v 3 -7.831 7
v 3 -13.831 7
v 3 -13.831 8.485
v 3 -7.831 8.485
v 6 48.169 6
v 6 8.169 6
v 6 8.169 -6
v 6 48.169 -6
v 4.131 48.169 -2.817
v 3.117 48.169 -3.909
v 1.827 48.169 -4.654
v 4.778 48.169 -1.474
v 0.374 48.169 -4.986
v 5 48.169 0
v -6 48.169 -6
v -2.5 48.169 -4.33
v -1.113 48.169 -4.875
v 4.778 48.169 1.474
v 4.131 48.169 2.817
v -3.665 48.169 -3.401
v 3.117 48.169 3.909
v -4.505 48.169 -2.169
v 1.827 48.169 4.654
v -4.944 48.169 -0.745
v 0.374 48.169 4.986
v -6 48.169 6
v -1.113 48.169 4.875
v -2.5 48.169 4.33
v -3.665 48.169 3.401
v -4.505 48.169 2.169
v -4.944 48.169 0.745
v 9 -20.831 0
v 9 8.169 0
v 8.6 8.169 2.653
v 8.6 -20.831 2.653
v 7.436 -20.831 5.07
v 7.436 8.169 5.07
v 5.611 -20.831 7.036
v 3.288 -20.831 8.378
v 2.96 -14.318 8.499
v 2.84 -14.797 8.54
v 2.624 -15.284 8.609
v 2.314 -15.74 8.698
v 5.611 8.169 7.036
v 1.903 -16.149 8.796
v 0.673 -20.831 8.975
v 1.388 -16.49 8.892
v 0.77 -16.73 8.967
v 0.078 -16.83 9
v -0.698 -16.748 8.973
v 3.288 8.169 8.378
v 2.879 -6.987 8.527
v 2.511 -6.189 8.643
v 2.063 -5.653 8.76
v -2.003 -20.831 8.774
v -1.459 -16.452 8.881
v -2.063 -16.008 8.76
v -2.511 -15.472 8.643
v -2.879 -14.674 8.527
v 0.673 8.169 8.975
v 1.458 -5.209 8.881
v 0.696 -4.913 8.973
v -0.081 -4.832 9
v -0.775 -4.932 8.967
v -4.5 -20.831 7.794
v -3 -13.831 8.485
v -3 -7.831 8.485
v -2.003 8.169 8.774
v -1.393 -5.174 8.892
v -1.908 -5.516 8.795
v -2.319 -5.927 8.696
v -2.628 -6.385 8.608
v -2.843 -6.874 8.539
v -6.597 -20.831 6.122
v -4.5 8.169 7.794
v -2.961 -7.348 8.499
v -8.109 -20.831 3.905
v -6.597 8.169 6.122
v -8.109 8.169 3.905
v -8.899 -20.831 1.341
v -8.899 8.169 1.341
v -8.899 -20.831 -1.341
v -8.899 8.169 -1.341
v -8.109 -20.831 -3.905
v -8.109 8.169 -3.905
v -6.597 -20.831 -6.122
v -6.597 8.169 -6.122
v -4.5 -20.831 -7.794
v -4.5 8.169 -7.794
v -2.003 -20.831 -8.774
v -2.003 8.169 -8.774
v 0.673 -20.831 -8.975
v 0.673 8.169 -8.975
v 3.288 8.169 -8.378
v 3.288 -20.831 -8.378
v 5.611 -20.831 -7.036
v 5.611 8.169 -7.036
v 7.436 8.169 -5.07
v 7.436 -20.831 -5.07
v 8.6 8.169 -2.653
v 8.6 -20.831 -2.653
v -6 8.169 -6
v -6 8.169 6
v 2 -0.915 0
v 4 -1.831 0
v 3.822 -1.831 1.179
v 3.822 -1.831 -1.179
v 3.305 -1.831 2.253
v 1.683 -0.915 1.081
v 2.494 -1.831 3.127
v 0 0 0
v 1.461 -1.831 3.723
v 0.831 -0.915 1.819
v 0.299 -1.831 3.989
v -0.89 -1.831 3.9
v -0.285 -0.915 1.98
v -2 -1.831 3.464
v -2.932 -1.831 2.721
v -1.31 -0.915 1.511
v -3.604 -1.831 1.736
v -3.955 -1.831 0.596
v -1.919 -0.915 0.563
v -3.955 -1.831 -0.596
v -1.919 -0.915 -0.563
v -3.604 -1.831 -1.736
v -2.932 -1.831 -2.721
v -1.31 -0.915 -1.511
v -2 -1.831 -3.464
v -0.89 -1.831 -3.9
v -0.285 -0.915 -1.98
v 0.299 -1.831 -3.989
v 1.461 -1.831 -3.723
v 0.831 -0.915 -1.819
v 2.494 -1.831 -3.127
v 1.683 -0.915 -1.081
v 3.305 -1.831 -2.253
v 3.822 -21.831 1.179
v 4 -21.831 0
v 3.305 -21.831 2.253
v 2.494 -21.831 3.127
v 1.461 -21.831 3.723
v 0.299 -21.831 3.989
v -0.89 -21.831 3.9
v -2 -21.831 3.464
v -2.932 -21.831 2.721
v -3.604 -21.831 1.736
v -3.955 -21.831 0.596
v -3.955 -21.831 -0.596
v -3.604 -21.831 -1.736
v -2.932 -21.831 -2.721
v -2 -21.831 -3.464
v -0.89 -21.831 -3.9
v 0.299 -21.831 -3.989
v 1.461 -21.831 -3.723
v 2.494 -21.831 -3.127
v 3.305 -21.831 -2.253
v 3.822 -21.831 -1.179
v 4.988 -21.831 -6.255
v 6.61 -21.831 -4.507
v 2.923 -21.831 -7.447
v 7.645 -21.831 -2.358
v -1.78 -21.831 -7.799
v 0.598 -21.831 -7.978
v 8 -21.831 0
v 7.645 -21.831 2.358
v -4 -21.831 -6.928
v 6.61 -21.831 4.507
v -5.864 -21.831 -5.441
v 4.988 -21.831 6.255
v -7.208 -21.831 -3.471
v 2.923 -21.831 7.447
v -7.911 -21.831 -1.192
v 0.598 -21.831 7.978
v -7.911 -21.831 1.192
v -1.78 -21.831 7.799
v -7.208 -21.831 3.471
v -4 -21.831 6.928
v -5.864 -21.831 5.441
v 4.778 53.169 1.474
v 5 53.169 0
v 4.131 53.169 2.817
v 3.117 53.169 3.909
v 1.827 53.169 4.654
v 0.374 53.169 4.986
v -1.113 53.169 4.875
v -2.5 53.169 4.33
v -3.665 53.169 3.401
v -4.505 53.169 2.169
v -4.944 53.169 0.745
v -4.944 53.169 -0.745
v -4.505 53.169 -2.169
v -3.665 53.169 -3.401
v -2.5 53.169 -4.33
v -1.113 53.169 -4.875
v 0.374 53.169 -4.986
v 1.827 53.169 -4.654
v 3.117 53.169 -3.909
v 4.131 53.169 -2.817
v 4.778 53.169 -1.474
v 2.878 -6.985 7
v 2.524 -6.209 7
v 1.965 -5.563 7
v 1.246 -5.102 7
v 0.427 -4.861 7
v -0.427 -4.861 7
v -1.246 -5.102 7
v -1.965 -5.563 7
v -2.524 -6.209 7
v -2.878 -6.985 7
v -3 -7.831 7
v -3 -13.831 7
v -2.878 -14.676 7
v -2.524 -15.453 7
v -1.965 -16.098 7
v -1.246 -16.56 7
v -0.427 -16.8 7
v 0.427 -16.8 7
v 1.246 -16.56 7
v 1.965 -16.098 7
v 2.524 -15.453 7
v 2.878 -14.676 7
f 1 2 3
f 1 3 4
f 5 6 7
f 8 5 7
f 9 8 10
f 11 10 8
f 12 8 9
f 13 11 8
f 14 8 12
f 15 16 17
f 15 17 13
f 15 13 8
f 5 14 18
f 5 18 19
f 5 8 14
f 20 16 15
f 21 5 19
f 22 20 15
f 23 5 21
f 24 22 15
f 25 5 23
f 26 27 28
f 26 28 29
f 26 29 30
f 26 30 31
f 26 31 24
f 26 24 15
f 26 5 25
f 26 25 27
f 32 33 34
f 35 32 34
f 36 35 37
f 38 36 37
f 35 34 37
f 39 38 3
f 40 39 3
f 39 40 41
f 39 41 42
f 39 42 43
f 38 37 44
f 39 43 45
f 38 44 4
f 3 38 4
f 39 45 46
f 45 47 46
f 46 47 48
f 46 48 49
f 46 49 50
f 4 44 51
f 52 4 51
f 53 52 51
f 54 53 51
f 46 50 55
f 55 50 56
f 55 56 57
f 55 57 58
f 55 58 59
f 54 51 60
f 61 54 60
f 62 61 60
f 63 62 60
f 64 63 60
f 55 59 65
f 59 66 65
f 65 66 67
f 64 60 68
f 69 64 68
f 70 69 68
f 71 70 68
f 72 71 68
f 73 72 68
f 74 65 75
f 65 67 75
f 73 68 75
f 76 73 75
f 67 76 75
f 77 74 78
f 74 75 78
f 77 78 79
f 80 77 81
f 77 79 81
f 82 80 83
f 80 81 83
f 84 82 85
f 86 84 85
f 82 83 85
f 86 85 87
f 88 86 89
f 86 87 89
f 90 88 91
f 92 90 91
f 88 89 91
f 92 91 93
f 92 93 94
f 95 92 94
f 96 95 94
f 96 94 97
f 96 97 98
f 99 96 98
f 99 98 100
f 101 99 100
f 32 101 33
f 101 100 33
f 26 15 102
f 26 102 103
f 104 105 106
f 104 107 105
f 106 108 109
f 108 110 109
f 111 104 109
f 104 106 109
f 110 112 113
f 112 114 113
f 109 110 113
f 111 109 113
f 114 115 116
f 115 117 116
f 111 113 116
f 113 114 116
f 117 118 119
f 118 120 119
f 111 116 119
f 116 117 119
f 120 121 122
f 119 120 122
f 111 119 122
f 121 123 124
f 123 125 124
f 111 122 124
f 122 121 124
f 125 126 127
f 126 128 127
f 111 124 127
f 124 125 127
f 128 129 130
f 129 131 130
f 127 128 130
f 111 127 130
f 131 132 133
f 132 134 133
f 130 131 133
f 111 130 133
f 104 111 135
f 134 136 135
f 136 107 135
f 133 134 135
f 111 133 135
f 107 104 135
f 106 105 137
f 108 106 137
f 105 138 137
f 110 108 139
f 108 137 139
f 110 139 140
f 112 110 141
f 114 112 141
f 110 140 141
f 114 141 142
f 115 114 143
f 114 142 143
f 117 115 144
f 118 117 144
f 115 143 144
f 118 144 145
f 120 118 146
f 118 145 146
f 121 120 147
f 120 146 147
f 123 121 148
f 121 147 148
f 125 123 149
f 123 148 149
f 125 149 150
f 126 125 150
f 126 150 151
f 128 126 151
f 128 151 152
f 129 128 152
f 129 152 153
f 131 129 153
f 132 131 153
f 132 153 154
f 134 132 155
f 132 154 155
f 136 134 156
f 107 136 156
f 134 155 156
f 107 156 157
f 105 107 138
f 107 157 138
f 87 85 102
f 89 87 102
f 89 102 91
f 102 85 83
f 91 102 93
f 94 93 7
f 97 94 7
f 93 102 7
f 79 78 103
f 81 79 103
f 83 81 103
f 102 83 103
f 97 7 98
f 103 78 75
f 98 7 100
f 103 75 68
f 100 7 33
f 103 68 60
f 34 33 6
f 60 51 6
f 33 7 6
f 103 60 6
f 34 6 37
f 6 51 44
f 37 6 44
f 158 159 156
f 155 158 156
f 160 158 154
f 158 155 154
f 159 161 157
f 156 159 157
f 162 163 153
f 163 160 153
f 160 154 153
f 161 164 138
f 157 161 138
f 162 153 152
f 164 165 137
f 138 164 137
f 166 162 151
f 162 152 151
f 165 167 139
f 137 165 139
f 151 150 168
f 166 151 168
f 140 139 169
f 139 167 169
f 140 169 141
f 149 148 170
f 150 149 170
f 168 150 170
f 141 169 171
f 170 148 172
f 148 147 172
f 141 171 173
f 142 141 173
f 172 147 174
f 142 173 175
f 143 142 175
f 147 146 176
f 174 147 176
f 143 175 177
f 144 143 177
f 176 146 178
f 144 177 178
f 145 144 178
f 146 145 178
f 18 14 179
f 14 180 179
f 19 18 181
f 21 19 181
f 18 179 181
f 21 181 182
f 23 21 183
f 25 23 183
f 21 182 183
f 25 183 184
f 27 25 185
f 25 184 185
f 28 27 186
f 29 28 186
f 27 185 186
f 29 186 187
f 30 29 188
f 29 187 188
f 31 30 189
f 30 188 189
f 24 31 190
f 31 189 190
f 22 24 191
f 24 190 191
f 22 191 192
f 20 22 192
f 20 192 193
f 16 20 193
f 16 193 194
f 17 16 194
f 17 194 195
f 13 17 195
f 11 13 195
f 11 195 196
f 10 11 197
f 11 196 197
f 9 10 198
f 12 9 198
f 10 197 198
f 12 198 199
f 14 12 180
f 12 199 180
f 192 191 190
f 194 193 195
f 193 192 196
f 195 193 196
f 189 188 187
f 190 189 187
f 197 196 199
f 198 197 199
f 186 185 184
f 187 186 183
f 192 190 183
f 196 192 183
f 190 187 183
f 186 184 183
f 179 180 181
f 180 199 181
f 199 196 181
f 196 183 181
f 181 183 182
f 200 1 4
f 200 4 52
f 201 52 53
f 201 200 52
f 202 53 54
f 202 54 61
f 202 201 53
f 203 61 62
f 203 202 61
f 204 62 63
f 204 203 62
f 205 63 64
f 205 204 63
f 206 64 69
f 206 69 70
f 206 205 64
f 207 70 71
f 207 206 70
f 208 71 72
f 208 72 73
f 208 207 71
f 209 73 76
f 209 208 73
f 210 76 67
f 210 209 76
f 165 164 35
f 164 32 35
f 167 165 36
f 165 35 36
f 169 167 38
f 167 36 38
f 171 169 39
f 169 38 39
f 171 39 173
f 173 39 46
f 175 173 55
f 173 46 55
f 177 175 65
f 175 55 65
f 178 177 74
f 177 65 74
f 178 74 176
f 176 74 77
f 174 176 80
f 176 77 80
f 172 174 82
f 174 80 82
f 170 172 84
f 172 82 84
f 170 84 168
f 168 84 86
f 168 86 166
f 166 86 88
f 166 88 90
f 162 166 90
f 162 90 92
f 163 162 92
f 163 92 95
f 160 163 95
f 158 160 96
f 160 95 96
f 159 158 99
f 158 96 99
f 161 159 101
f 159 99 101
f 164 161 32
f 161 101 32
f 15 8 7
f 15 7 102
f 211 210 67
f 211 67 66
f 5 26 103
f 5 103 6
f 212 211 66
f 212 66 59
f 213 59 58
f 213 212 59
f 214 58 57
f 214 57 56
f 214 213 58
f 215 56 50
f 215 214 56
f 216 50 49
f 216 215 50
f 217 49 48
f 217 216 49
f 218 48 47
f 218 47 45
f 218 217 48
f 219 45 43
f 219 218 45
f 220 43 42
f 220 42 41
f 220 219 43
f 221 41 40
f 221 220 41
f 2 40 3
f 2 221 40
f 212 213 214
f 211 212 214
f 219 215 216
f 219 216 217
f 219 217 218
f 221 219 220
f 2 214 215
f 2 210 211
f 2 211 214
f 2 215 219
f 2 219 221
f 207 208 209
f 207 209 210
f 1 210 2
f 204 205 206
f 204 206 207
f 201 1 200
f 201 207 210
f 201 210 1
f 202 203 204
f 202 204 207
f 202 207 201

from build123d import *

# Parameters (mm, degrees)
F4_DEPTH = 25
F6_DEPTH = 40


with BuildPart() as f1:
    # F0 (on Top) → F1 (revolve)
    with BuildSketch(Plane.XY):
        Polygon((5, 53.16937), (0, 53.16937), (0, 0), (4, -1.83063), (4, -6.83063), (4, -21.83063), (8, -21.83063), (9, -20.83063), (9, 8.16937), (6, 8.16937), (6, 48.16937), (5, 48.16937), align=None)
    revolve(axis=Axis((0, 26.584685, 0), (0, -1, 0)))

    # F3 (on offset) → F4 (cut)
    with BuildSketch(Plane.XY.offset(7)):
        with BuildLine():
            ThreePointArc((-3, -13.83063), (0, -16.83063), (3, -13.83063))
            Line((3, -13.83063), (3, -7.83063))
            ThreePointArc((3, -7.83063), (0, -4.83063), (-3, -7.83063))
            Line((-3, -7.83063), (-3, -13.83063))
        make_face()
    extrude(amount=F4_DEPTH, mode=Mode.SUBTRACT)

    # F5 (on face) → F6 (join, through all)
    with BuildSketch(Plane(origin=(0, 48.16937, 0), x_dir=(-1, 0, 0), z_dir=(0, 1, 0))):
        with BuildLine():
            Line((0, 6), (-6, 6))
            Line((-6, 6), (-6, 0))
            ThreePointArc((-6, 0), (-4.242641, 4.242641), (0, 6))
        make_face()
        with BuildLine():
            ThreePointArc((0, -6), (-4.242641, -4.242641), (-6, 0))
            Line((-6, 0), (-6, -6))
            Line((-6, -6), (0, -6))
        make_face()
        with BuildLine():
            Line((6, -6), (6, 0))
            ThreePointArc((6, 0), (4.242641, -4.242641), (0, -6))
            Line((0, -6), (6, -6))
        make_face()
        with BuildLine():
            Line((6, 6), (0, 6))
            ThreePointArc((0, 6), (4.242641, 4.242641), (6, 0))
            Line((6, 0), (6, 6))
        make_face()
    extrude(amount=-F6_DEPTH)


solid = f1.part
